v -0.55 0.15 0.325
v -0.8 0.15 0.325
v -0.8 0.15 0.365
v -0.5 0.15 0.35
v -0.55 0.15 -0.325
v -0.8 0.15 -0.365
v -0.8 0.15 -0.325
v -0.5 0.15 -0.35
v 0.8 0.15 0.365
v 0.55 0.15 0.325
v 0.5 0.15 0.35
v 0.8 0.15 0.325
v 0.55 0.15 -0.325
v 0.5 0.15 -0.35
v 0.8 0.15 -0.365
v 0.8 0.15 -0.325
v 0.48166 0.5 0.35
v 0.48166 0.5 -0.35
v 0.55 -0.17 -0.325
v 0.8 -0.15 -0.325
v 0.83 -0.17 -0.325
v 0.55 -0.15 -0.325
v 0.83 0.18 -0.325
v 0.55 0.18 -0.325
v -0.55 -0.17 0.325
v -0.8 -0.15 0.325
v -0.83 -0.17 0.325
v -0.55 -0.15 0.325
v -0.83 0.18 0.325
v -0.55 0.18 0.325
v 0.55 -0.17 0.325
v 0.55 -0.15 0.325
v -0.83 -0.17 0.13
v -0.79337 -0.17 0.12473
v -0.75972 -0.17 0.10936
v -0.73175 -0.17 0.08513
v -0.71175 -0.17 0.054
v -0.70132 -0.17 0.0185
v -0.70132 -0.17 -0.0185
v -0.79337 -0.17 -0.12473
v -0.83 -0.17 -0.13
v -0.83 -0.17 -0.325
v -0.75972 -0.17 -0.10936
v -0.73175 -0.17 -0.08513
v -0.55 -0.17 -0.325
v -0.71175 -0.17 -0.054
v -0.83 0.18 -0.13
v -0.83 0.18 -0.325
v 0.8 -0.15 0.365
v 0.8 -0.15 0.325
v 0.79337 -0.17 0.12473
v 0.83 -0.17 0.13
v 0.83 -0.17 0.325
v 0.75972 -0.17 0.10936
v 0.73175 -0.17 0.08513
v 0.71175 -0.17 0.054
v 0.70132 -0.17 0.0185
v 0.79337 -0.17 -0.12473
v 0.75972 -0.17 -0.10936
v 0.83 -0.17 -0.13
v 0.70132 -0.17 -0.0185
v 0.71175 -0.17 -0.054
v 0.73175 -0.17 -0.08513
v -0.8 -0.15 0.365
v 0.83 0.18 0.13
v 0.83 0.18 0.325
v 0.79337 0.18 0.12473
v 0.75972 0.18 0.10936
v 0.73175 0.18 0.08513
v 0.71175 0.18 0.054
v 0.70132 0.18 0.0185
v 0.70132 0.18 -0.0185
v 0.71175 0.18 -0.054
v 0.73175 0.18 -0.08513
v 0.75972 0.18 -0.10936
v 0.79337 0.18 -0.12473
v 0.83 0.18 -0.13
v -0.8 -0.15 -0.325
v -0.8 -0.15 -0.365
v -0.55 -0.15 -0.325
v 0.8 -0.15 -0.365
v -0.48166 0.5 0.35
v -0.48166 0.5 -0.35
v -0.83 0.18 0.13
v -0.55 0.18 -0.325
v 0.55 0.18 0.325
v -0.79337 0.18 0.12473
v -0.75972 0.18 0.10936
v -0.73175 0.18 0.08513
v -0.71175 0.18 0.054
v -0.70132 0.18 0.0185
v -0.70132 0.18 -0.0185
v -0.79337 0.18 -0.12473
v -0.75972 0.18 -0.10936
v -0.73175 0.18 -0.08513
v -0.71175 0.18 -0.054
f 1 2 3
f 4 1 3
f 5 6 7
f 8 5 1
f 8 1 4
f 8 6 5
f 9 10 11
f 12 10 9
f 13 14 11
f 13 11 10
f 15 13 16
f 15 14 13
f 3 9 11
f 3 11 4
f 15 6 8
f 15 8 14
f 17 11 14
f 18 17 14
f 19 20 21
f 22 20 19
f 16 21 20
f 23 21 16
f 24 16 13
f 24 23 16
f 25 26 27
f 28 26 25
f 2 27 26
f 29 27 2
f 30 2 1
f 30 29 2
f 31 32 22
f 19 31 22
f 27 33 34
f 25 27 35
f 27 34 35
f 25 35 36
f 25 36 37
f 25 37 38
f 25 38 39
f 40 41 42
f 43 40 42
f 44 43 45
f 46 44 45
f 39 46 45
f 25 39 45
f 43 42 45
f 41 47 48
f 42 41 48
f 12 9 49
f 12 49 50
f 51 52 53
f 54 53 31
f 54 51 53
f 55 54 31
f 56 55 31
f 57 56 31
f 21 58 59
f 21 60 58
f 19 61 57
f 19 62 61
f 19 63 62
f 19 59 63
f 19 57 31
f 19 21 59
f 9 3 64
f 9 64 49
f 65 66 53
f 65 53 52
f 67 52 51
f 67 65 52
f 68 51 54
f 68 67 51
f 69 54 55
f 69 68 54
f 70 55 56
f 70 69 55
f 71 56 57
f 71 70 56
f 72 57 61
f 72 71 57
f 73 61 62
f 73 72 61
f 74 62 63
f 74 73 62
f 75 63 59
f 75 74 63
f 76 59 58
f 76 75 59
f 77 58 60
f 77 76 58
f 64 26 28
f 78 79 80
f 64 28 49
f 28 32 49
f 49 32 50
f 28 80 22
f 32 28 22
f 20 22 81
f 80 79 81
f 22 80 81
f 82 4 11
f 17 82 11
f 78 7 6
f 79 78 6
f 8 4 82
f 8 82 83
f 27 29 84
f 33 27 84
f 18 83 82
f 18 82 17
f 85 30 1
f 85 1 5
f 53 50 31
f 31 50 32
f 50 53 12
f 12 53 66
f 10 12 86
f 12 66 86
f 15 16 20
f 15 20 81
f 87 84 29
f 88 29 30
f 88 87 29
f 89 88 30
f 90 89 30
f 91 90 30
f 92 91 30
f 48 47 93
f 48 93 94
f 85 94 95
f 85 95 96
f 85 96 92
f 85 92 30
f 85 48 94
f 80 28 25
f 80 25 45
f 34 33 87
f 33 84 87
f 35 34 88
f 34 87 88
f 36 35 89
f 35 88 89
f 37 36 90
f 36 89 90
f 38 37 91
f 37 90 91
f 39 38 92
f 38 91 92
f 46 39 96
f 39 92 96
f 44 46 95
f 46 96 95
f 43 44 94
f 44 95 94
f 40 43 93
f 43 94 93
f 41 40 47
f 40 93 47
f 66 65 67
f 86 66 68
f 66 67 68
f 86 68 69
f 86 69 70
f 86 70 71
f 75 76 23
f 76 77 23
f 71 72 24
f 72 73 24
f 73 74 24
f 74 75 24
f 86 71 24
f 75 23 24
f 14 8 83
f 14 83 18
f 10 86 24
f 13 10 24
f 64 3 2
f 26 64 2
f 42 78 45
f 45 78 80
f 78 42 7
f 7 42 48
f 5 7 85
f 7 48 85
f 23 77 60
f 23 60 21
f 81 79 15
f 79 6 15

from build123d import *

# Parameters (mm, degrees)
SKETCH_1_W          = 1.6
SKETCH_1_H          = 0.73
EXTRUDE_1_DEPTH     = 0.15
SKETCH_2_W          = 0.28
SKETCH_2_H          = 0.65
EXTRUDE_2_DEPTH     = 0.35
SKETCH_4_R          = 0.13
CUT_EXTRUDE_1_DEPTH = 0.5
SKETCH_5_W          = 1
SKETCH_5_H          = 0.7
EXTRUDE_3_DEPTH     = 0.35
DRAFT_1_ANGLE       = 3


with BuildPart() as part:
    # 草图1 → 凸台-拉伸1 (new, symmetric)
    with BuildSketch(Plane(origin=(0, 0, 0), x_dir=(1, 0, 0), z_dir=(0, 1, 0))):
        Rectangle(SKETCH_1_W, SKETCH_1_H)
    extrude(amount=EXTRUDE_1_DEPTH, both=True)

    # 草图2 → 凸台-拉伸2 (add)
    with BuildSketch(Plane(origin=(0, 0.18, 0), x_dir=(1, 0, 0), z_dir=(0, 1, 0))):
        with Locations((-0.69, 0)):
            Rectangle(SKETCH_2_W, SKETCH_2_H)
    extrude_2 = extrude(amount=-EXTRUDE_2_DEPTH)

    # 草图4 → 切除-拉伸1 (cut, symmetric)
    with BuildSketch(Plane(origin=(0, 0, 0), x_dir=(1, 0, 0), z_dir=(0, 1, 0))):
        with Locations((-0.83, 0)):
            Circle(SKETCH_4_R)
    cut_extrude_1 = extrude(amount=CUT_EXTRUDE_1_DEPTH, both=True, mode=Mode.SUBTRACT)

    # 镜向1: 凸台-拉伸2, 切除-拉伸1 across plane
    add(extrude_2.mirror(Plane(origin=(0, 0, 0), x_dir=(0, 0, 1), z_dir=(1, 0, 0))))
    add(cut_extrude_1.mirror(Plane(origin=(0, 0, 0), x_dir=(0, 0, 1), z_dir=(1, 0, 0))), mode=Mode.SUBTRACT)

    # 草图5 → 凸台-拉伸3 (add)
    with BuildSketch(Plane(origin=(0, 0.15, 0), x_dir=(1, 0, 0), z_dir=(0, 1, 0))):
        Rectangle(SKETCH_5_W, SKETCH_5_H)
    extrude(amount=EXTRUDE_3_DEPTH)

    # 拔模1
    draft_1_faces = [part.faces().sort_by_distance(p)[0] for p in [
        (0.5, 0.325, 0),
        (-0.5, 0.325, 0),
    ]]
    draft(draft_1_faces, Plane.ZX.offset(0.15), DRAFT_1_ANGLE)


solid = part.part
